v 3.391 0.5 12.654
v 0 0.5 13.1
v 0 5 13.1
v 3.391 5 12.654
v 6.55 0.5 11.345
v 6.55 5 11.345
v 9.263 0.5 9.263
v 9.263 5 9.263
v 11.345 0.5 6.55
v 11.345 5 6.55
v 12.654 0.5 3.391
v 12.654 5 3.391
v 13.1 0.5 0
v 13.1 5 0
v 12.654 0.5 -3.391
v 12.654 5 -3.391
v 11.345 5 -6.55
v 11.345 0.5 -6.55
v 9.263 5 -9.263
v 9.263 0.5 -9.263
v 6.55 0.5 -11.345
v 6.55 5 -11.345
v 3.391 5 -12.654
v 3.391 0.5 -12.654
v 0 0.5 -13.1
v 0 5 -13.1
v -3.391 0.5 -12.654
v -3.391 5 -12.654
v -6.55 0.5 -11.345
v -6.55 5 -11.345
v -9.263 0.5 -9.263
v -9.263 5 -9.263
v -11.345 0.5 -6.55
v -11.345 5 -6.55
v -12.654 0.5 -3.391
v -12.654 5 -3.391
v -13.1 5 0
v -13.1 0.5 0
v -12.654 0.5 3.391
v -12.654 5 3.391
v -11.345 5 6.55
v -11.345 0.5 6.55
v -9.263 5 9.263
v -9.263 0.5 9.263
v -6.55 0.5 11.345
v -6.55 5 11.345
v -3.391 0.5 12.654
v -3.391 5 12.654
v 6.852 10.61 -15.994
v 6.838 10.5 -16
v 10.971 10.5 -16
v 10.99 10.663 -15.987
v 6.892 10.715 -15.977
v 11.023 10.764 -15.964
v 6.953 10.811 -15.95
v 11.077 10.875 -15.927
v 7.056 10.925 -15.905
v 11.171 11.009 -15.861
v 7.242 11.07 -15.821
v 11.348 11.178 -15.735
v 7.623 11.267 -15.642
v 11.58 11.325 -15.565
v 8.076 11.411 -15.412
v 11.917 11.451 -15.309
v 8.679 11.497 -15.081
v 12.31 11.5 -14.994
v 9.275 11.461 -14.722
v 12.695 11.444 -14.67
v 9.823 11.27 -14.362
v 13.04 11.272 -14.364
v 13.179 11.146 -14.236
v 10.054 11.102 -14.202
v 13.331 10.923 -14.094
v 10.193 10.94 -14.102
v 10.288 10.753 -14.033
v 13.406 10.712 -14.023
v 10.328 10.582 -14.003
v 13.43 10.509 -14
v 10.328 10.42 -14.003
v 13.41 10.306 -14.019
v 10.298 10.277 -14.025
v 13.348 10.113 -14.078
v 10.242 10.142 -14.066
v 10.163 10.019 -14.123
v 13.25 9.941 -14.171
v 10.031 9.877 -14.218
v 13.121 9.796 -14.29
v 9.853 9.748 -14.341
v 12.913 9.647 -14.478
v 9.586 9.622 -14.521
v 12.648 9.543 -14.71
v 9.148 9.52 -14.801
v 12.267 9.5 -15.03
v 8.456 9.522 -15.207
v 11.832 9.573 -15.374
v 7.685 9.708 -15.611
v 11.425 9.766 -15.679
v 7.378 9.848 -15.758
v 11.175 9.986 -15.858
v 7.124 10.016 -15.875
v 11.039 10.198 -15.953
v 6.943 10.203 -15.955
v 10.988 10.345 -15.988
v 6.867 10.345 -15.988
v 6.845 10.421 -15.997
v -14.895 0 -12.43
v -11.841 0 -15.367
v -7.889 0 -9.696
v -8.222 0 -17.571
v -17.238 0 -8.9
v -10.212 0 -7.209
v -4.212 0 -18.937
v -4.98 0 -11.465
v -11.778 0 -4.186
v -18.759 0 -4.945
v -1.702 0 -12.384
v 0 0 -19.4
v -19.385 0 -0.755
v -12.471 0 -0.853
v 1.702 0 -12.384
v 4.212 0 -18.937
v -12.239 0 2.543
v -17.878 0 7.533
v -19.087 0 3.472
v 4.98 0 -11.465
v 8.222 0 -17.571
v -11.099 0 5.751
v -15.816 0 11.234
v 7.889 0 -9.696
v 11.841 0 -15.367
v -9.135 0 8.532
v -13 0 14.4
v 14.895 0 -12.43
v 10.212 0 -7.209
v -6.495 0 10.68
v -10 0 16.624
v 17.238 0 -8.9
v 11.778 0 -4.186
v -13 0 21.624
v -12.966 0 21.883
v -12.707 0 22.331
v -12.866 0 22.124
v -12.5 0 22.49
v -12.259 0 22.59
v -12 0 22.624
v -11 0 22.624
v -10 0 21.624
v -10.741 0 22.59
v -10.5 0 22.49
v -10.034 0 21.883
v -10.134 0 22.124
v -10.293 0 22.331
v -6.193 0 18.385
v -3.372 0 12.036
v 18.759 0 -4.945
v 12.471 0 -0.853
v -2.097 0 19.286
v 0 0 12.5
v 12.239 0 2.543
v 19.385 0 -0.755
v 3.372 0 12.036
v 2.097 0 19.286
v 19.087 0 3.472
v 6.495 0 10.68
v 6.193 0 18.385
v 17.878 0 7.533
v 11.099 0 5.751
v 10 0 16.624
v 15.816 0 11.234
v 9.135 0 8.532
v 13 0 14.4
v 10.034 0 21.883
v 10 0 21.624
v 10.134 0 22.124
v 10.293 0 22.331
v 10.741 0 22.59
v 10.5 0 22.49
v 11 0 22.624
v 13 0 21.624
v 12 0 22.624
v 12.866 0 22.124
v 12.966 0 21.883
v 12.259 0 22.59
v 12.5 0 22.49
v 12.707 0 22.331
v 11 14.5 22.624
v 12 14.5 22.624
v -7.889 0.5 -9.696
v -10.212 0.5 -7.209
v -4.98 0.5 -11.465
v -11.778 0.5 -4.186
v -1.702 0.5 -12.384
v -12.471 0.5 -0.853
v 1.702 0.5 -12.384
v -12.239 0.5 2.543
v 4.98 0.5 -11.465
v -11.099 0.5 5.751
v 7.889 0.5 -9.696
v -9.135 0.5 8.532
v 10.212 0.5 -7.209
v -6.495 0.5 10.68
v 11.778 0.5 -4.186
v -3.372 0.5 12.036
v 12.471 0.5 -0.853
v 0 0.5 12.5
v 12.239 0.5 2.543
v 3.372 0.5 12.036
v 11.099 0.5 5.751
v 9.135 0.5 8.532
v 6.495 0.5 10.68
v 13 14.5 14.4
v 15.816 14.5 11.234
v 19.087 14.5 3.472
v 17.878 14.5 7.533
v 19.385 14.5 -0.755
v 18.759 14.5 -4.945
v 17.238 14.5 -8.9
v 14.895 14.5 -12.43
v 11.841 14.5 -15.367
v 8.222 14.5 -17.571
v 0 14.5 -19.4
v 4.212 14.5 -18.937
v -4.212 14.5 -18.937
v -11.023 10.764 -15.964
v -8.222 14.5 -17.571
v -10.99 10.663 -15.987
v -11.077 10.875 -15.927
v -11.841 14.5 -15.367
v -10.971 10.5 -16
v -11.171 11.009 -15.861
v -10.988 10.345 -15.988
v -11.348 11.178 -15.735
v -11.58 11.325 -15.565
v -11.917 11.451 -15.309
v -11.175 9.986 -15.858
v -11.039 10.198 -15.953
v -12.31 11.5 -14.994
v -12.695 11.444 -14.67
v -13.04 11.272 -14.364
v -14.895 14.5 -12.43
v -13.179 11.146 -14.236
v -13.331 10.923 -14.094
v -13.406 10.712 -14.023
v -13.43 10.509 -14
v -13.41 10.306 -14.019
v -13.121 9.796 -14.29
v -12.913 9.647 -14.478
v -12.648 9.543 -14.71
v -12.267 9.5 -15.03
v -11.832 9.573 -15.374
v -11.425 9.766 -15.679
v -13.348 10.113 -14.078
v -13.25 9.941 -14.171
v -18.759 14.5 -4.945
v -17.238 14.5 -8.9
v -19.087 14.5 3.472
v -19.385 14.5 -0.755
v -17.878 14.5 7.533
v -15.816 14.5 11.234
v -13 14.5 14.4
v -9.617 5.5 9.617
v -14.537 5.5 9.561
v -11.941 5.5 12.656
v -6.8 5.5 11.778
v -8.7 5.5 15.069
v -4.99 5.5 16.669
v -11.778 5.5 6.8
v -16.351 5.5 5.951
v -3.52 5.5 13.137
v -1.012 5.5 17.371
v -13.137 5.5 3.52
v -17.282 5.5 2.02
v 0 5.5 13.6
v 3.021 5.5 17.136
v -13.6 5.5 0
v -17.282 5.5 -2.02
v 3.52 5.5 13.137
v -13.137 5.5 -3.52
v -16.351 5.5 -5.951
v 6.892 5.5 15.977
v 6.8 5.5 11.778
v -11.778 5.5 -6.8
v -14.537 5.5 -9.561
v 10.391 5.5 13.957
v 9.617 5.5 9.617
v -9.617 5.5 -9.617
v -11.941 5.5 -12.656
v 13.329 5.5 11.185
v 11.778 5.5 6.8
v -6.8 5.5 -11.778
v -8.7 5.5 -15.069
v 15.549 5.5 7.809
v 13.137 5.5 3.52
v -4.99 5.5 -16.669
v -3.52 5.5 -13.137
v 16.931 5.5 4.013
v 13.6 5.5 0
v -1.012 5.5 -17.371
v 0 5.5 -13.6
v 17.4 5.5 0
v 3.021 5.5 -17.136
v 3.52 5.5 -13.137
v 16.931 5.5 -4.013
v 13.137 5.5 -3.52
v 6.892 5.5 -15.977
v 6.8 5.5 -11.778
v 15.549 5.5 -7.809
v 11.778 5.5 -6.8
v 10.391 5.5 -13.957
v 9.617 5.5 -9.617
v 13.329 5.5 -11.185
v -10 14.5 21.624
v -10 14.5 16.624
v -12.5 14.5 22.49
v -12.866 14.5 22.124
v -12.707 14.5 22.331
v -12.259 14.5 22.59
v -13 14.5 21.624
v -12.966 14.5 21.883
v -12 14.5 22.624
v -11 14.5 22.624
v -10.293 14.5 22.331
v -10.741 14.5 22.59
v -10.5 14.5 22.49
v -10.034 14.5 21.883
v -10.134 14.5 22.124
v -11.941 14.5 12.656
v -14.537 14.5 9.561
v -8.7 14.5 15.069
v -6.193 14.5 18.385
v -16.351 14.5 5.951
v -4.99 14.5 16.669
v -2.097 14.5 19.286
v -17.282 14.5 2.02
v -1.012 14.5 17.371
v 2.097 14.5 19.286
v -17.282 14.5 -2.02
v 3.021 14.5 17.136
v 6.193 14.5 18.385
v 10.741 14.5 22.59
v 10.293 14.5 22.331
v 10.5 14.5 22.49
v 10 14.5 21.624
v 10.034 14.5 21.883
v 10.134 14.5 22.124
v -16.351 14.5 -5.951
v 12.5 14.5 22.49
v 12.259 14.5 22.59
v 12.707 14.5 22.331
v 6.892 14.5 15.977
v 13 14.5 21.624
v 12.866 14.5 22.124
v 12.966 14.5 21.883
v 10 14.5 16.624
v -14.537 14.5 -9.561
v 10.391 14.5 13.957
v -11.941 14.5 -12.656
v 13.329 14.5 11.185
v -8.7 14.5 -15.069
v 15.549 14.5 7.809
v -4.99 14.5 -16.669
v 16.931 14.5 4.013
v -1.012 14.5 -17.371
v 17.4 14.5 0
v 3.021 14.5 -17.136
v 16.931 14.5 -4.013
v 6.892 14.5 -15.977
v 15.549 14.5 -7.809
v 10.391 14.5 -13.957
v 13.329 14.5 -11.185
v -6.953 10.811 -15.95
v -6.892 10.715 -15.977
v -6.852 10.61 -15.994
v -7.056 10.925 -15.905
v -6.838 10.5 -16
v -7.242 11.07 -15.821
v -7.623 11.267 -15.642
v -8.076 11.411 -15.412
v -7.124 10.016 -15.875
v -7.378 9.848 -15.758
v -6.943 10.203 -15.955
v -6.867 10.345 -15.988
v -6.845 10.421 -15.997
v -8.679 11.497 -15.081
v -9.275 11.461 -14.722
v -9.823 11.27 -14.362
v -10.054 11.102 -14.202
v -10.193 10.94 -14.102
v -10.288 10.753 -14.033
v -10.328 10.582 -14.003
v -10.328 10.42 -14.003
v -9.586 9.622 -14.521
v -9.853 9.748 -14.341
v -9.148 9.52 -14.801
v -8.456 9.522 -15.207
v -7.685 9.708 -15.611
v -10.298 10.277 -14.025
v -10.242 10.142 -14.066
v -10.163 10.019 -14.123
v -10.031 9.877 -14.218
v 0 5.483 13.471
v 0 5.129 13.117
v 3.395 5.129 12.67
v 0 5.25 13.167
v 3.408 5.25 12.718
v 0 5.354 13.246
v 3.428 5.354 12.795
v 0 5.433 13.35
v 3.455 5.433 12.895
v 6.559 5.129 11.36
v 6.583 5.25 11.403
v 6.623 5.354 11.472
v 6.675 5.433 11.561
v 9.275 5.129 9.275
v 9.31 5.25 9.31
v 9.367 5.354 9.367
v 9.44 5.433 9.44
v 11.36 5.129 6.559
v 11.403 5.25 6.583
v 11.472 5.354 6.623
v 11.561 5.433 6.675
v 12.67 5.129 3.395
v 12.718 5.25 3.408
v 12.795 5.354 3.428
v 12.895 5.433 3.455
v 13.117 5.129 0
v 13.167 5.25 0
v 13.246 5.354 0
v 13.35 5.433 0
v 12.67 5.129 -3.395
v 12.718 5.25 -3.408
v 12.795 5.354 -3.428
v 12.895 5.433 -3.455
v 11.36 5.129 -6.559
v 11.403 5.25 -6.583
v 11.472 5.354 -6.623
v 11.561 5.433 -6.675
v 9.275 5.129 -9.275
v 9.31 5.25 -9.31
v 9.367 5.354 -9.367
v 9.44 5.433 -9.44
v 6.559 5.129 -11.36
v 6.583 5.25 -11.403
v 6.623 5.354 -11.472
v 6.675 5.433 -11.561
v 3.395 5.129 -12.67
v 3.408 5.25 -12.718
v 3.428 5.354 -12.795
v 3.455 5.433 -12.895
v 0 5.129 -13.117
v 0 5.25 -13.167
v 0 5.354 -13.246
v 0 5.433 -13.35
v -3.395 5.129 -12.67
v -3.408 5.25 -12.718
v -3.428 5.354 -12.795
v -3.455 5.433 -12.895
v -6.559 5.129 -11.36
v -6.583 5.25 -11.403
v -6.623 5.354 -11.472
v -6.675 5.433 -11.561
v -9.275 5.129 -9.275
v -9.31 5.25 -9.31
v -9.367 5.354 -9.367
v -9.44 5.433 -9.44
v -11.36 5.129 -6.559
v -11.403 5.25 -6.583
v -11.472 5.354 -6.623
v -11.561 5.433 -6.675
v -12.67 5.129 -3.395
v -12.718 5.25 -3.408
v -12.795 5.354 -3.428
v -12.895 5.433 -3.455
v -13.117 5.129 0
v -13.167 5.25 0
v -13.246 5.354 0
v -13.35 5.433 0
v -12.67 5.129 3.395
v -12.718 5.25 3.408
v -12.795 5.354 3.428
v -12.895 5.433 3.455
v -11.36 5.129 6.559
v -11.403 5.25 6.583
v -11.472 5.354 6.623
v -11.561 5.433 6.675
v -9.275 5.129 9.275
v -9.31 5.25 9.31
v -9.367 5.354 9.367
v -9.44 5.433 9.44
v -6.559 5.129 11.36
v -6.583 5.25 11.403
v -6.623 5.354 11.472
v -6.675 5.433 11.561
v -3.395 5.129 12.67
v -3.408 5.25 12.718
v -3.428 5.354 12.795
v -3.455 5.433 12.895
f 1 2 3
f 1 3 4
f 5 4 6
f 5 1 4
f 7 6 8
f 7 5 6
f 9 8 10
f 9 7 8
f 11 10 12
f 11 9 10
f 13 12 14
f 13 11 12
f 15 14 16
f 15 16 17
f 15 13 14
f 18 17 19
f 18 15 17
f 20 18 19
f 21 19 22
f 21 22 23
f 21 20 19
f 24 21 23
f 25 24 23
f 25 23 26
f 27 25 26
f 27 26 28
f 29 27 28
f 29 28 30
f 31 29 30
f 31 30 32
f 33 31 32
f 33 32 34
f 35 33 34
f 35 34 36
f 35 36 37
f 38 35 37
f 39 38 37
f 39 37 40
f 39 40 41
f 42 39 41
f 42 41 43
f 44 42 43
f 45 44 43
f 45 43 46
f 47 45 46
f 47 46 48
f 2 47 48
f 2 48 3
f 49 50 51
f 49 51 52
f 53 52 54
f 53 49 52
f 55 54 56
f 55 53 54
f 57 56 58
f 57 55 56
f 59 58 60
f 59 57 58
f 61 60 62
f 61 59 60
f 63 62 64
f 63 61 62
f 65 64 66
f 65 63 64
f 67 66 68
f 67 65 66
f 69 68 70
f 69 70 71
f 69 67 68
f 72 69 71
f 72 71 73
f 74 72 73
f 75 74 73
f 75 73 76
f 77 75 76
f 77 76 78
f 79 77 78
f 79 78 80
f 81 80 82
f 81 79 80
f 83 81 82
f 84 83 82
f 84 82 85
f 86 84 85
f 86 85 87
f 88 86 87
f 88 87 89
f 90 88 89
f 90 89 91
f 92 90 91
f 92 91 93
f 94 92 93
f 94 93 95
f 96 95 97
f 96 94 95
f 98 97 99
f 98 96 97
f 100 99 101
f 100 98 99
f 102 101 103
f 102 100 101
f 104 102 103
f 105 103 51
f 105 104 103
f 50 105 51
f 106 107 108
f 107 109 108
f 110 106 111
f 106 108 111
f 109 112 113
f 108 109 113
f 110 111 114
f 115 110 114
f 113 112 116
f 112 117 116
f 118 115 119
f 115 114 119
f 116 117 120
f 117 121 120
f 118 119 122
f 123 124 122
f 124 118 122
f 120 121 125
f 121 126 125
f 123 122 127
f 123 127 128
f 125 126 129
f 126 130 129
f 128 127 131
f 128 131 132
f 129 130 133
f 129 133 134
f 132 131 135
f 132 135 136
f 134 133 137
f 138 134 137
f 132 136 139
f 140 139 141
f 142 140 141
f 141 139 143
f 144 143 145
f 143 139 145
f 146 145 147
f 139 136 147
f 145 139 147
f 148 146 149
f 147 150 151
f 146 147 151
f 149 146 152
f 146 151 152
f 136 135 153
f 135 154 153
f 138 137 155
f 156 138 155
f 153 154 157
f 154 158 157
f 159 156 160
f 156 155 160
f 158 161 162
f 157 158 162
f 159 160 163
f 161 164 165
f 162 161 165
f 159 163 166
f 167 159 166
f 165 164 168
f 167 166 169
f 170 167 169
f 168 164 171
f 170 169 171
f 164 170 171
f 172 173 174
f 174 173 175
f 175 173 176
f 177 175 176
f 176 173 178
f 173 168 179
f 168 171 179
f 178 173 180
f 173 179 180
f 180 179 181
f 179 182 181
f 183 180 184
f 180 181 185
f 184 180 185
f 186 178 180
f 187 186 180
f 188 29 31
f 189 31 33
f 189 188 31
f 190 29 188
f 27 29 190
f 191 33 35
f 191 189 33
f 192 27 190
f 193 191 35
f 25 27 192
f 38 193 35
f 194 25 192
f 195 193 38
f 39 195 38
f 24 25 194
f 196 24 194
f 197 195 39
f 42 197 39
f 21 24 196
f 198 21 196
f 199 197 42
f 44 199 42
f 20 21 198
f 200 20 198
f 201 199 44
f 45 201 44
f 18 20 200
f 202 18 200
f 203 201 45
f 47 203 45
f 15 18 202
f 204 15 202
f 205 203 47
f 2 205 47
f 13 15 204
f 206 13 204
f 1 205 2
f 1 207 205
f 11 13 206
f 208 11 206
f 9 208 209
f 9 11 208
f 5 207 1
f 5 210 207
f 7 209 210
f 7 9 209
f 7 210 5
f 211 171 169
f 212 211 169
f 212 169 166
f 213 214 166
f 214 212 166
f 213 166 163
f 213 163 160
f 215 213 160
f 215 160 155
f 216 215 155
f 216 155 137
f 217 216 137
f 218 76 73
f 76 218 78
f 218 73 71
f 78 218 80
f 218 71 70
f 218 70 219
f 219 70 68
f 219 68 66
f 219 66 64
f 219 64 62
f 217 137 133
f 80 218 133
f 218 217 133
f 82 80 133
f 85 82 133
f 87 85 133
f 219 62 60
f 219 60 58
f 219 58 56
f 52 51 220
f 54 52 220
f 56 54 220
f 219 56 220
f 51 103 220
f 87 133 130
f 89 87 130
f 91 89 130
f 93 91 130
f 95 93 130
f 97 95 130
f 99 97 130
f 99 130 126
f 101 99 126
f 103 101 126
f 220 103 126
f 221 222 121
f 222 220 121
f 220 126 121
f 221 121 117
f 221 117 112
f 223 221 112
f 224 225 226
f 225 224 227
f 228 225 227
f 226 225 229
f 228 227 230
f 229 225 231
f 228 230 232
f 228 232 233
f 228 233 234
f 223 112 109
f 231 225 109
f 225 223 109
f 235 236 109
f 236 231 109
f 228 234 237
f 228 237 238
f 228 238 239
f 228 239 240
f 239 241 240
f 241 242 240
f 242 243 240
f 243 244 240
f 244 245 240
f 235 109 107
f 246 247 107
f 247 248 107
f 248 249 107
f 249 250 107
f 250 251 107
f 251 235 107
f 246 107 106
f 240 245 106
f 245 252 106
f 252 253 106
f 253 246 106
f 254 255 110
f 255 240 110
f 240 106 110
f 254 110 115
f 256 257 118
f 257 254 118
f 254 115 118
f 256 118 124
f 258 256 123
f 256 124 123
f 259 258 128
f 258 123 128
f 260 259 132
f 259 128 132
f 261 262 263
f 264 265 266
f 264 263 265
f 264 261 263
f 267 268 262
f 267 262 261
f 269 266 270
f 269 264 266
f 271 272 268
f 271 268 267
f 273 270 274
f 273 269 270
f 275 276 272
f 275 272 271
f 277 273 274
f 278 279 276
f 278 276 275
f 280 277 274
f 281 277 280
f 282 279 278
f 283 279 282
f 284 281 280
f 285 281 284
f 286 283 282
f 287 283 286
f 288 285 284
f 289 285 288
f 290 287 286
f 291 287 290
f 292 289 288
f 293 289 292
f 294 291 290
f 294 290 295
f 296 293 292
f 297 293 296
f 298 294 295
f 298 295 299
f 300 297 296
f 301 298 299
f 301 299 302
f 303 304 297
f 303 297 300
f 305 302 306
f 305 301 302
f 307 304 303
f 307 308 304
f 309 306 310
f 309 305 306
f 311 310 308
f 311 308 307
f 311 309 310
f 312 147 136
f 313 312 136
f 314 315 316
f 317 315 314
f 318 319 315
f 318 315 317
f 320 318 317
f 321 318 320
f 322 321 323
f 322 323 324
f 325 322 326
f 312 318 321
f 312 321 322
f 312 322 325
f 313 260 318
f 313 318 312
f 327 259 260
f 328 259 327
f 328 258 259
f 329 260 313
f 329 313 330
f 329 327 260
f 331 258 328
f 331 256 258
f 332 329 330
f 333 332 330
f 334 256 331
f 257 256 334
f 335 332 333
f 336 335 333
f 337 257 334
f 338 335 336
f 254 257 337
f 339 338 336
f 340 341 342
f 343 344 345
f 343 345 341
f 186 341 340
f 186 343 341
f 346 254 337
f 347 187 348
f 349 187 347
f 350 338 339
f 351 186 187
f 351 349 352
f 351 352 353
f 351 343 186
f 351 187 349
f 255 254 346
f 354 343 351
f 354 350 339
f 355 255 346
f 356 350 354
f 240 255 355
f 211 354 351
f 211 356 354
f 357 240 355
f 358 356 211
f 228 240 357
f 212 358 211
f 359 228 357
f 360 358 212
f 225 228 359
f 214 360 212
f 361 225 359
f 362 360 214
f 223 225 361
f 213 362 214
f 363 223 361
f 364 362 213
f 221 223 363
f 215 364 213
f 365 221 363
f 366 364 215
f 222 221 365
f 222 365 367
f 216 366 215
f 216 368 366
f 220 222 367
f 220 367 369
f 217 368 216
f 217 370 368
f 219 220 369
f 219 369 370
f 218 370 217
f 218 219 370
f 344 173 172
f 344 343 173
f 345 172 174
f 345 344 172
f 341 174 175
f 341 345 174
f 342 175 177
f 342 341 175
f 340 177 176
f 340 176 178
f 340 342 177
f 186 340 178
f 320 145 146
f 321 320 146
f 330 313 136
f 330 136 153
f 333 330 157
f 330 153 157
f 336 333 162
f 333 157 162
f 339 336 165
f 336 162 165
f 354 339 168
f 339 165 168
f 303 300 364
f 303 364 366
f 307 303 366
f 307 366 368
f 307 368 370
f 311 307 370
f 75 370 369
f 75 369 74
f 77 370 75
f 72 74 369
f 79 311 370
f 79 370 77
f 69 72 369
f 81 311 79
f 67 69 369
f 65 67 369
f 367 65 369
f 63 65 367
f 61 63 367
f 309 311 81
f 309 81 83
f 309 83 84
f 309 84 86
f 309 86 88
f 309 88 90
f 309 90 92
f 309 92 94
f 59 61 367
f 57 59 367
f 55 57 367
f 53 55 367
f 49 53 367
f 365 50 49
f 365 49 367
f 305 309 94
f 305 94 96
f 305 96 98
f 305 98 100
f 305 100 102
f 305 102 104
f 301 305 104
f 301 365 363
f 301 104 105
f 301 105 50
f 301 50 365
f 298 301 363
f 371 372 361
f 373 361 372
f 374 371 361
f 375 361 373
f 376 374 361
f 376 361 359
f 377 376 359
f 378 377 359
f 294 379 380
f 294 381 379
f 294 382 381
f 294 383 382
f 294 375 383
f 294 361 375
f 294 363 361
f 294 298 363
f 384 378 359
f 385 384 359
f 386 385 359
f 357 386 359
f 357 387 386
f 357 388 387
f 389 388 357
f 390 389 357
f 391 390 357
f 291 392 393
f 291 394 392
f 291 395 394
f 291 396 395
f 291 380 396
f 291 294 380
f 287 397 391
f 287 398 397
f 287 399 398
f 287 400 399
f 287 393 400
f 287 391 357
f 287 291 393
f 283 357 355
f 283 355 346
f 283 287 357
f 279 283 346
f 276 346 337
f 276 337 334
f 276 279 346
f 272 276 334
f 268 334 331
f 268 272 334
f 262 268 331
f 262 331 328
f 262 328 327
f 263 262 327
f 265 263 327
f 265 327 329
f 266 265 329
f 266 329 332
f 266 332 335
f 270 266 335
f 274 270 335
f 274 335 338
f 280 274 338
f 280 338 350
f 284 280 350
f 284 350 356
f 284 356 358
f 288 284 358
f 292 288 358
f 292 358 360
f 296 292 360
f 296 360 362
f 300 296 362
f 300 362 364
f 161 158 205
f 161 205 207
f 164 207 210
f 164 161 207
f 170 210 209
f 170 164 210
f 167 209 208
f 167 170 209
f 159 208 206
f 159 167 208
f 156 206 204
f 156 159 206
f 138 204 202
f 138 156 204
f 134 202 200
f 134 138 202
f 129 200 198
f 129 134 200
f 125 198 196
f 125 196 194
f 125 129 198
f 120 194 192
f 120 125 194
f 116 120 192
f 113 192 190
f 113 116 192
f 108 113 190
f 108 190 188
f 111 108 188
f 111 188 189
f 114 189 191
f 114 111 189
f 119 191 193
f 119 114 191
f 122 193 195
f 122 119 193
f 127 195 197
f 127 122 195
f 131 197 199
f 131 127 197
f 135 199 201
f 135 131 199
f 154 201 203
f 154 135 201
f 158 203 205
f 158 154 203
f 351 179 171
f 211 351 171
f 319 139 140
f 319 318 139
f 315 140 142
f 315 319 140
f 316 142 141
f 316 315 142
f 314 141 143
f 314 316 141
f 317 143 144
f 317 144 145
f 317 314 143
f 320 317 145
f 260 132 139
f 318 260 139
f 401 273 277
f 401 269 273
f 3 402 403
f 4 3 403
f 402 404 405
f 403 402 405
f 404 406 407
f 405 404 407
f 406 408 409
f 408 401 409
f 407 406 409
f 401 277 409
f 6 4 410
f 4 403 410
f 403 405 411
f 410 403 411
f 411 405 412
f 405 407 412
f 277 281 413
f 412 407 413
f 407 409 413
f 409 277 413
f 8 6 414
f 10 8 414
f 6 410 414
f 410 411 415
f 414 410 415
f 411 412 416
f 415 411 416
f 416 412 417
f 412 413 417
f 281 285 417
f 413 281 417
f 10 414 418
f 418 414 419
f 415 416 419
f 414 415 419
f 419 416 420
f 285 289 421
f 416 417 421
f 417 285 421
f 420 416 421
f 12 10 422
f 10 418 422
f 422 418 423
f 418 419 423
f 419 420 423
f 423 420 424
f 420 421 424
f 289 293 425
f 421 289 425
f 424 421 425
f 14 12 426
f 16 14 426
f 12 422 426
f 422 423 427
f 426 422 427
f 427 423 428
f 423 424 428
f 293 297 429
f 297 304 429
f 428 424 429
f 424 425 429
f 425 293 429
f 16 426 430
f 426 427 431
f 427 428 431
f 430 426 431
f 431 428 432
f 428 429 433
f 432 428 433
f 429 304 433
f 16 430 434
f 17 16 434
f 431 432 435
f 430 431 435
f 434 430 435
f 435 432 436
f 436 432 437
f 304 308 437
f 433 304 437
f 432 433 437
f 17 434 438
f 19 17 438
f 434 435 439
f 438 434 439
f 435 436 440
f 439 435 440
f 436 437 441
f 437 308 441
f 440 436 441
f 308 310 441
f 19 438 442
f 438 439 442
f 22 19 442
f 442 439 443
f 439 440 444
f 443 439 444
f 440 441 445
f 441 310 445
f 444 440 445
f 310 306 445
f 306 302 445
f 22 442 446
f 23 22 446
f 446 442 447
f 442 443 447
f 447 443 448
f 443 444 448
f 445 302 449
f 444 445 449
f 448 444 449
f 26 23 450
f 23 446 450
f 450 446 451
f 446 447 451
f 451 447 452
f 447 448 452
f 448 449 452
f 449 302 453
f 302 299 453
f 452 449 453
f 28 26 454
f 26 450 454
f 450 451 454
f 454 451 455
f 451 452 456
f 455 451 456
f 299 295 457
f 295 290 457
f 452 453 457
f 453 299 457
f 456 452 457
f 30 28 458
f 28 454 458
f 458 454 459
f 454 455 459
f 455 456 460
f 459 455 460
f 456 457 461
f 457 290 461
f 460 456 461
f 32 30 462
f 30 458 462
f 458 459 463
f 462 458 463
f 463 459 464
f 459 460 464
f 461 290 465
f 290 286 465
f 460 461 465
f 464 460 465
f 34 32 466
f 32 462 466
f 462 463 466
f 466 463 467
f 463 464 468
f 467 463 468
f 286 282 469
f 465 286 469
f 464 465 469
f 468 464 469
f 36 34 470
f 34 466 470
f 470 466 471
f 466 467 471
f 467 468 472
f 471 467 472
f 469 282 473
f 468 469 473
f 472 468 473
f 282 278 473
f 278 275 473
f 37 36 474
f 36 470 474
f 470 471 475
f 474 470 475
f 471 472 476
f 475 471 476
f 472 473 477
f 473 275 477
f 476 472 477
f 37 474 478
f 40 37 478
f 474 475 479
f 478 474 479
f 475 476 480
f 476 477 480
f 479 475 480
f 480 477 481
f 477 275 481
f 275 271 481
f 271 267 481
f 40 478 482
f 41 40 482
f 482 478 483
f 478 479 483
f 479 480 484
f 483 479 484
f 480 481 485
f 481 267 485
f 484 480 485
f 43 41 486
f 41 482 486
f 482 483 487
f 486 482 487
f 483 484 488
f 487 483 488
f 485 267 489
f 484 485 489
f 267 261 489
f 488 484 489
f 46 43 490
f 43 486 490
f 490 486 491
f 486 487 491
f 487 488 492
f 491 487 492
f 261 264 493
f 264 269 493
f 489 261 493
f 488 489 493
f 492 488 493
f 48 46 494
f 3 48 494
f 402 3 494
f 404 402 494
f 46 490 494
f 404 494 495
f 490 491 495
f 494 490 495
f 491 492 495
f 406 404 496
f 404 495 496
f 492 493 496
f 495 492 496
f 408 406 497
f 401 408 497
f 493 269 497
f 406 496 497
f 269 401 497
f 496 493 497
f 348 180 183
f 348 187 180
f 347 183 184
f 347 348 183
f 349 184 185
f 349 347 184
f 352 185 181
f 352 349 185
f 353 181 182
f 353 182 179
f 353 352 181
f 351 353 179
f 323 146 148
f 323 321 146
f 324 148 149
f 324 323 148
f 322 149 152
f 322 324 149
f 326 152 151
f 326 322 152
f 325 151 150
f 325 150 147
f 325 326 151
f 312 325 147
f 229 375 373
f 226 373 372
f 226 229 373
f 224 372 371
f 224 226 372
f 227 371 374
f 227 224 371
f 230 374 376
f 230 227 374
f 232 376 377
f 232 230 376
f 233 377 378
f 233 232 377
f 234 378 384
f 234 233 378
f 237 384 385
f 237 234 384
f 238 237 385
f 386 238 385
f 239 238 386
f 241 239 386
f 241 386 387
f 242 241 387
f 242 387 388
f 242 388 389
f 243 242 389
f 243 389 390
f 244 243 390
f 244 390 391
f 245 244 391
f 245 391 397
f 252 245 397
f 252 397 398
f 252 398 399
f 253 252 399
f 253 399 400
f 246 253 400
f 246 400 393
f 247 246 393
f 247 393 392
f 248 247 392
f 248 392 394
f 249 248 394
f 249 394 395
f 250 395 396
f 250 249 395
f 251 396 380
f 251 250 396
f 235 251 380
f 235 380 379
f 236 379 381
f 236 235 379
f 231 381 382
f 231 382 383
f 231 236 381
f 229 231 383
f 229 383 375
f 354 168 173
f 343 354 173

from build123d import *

# Parameters (mm, degrees)
SKETCH_1_R               = 19.4
SKETCH_1_R_2             = 17.4
EXTRUDE_1_DEPTH          = 14.5
SKETCH_2_R               = 17.5
SKETCH_2_R_2             = 13.1
EXTRUDE_1_2_DEPTH        = 5.5
SKETCH_3_R               = 13.1
SKETCH_3_R_2             = 12.5
EXTRUDE_2_DEPTH          = 0.5
EXTRUDE_3_DEPTH          = 14.5
CUT_EXTRUDE_1_DEPTH      = 34.143007514
CUT_EXTRUDE_1_DEPTH_BACK = 34.143007514
SKETCH_6_R               = 1
FILLET_1_R               = 1
FILLET_2_R               = 0.5


with BuildPart() as part:
    # 草图1 → Extrude 1 (new body)
    with BuildSketch(Plane(origin=(0, 0, 0), x_dir=(1, 0, 0), z_dir=(0, 1, 0))):
        Circle(SKETCH_1_R)
        Circle(SKETCH_1_R_2, mode=Mode.SUBTRACT)
    extrude(amount=EXTRUDE_1_DEPTH)

    # 草图2 → Extrude 1 2 (add)
    with BuildSketch(Plane(origin=(0, 0, 0), x_dir=(1, 0, 0), z_dir=(0, 1, 0))):
        Circle(SKETCH_2_R)
        with Locations(Location((0, 0, 0), (0, 0, 270))):
            Circle(SKETCH_2_R_2, mode=Mode.SUBTRACT)
    extrude(amount=EXTRUDE_1_2_DEPTH)

    # 草图3 → 凸台-拉伸2 (add)
    with BuildSketch(Plane(origin=(0, 0, 0), x_dir=(1, 0, 0), z_dir=(0, 1, 0))):
        with Locations(Location((0, 0, 0), (0, 0, 270))):
            Circle(SKETCH_3_R)
        with Locations(Location((0, 0, 0), (0, 0, 270))):
            Circle(SKETCH_3_R_2, mode=Mode.SUBTRACT)
    extrude(amount=EXTRUDE_2_DEPTH)

    # 草图4 → 凸台-拉伸3 (add)
    with BuildSketch(Plane(origin=(0, 0, 0), x_dir=(1, 0, 0), z_dir=(0, 1, 0))):
        with BuildLine():
            ThreePointArc((-10, -16.624078922), (-11.553641494, -15.584395023), (-13, -14.4))
            Line((-13, -14.4), (-13, -22.624078922))
            Line((-13, -22.624078922), (-10, -22.624078922))
            Line((-10, -22.624078922), (-10, -16.624078922))
        make_face()
        with BuildLine():
            Line((13, -22.624078922), (13, -14.4))
            ThreePointArc((13, -14.4), (11.553641494, -15.584395023), (10, -16.624078922))
            Line((10, -16.624078922), (10, -22.624078922))
            Line((10, -22.624078922), (13, -22.624078922))
        make_face()
    extrude(amount=EXTRUDE_3_DEPTH)

    # 草图6 → 切除-拉伸1 (cut, two sides: drawn at the far end of the back side and taken through both)
    with BuildSketch(Plane(origin=(0, 0, 0), x_dir=(0, 0, -1), z_dir=(1, 0, 0)).offset(-CUT_EXTRUDE_1_DEPTH_BACK)):
        with Locations((15, 10.5)):
            Circle(SKETCH_6_R)
    extrude(amount=CUT_EXTRUDE_1_DEPTH + CUT_EXTRUDE_1_DEPTH_BACK, mode=Mode.SUBTRACT)

    # 圆角1
    fillet_1_edges = [part.edges().sort_by_distance(p)[0] for p in [
        (-13, 7.25, 22.624078922),
        (-10, 7.25, 22.624078922),
        (13, 7.25, 22.624078922),
        (10, 7.25, 22.624078922),
    ]]
    fillet(fillet_1_edges, radius=FILLET_1_R)

    # 圆角2
    fillet_2_edges = [part.edges().sort_by_distance(p)[0] for p in [
        (0, 5.5, -13.1),
    ]]
    fillet(fillet_2_edges, radius=FILLET_2_R)


solid = part.part
